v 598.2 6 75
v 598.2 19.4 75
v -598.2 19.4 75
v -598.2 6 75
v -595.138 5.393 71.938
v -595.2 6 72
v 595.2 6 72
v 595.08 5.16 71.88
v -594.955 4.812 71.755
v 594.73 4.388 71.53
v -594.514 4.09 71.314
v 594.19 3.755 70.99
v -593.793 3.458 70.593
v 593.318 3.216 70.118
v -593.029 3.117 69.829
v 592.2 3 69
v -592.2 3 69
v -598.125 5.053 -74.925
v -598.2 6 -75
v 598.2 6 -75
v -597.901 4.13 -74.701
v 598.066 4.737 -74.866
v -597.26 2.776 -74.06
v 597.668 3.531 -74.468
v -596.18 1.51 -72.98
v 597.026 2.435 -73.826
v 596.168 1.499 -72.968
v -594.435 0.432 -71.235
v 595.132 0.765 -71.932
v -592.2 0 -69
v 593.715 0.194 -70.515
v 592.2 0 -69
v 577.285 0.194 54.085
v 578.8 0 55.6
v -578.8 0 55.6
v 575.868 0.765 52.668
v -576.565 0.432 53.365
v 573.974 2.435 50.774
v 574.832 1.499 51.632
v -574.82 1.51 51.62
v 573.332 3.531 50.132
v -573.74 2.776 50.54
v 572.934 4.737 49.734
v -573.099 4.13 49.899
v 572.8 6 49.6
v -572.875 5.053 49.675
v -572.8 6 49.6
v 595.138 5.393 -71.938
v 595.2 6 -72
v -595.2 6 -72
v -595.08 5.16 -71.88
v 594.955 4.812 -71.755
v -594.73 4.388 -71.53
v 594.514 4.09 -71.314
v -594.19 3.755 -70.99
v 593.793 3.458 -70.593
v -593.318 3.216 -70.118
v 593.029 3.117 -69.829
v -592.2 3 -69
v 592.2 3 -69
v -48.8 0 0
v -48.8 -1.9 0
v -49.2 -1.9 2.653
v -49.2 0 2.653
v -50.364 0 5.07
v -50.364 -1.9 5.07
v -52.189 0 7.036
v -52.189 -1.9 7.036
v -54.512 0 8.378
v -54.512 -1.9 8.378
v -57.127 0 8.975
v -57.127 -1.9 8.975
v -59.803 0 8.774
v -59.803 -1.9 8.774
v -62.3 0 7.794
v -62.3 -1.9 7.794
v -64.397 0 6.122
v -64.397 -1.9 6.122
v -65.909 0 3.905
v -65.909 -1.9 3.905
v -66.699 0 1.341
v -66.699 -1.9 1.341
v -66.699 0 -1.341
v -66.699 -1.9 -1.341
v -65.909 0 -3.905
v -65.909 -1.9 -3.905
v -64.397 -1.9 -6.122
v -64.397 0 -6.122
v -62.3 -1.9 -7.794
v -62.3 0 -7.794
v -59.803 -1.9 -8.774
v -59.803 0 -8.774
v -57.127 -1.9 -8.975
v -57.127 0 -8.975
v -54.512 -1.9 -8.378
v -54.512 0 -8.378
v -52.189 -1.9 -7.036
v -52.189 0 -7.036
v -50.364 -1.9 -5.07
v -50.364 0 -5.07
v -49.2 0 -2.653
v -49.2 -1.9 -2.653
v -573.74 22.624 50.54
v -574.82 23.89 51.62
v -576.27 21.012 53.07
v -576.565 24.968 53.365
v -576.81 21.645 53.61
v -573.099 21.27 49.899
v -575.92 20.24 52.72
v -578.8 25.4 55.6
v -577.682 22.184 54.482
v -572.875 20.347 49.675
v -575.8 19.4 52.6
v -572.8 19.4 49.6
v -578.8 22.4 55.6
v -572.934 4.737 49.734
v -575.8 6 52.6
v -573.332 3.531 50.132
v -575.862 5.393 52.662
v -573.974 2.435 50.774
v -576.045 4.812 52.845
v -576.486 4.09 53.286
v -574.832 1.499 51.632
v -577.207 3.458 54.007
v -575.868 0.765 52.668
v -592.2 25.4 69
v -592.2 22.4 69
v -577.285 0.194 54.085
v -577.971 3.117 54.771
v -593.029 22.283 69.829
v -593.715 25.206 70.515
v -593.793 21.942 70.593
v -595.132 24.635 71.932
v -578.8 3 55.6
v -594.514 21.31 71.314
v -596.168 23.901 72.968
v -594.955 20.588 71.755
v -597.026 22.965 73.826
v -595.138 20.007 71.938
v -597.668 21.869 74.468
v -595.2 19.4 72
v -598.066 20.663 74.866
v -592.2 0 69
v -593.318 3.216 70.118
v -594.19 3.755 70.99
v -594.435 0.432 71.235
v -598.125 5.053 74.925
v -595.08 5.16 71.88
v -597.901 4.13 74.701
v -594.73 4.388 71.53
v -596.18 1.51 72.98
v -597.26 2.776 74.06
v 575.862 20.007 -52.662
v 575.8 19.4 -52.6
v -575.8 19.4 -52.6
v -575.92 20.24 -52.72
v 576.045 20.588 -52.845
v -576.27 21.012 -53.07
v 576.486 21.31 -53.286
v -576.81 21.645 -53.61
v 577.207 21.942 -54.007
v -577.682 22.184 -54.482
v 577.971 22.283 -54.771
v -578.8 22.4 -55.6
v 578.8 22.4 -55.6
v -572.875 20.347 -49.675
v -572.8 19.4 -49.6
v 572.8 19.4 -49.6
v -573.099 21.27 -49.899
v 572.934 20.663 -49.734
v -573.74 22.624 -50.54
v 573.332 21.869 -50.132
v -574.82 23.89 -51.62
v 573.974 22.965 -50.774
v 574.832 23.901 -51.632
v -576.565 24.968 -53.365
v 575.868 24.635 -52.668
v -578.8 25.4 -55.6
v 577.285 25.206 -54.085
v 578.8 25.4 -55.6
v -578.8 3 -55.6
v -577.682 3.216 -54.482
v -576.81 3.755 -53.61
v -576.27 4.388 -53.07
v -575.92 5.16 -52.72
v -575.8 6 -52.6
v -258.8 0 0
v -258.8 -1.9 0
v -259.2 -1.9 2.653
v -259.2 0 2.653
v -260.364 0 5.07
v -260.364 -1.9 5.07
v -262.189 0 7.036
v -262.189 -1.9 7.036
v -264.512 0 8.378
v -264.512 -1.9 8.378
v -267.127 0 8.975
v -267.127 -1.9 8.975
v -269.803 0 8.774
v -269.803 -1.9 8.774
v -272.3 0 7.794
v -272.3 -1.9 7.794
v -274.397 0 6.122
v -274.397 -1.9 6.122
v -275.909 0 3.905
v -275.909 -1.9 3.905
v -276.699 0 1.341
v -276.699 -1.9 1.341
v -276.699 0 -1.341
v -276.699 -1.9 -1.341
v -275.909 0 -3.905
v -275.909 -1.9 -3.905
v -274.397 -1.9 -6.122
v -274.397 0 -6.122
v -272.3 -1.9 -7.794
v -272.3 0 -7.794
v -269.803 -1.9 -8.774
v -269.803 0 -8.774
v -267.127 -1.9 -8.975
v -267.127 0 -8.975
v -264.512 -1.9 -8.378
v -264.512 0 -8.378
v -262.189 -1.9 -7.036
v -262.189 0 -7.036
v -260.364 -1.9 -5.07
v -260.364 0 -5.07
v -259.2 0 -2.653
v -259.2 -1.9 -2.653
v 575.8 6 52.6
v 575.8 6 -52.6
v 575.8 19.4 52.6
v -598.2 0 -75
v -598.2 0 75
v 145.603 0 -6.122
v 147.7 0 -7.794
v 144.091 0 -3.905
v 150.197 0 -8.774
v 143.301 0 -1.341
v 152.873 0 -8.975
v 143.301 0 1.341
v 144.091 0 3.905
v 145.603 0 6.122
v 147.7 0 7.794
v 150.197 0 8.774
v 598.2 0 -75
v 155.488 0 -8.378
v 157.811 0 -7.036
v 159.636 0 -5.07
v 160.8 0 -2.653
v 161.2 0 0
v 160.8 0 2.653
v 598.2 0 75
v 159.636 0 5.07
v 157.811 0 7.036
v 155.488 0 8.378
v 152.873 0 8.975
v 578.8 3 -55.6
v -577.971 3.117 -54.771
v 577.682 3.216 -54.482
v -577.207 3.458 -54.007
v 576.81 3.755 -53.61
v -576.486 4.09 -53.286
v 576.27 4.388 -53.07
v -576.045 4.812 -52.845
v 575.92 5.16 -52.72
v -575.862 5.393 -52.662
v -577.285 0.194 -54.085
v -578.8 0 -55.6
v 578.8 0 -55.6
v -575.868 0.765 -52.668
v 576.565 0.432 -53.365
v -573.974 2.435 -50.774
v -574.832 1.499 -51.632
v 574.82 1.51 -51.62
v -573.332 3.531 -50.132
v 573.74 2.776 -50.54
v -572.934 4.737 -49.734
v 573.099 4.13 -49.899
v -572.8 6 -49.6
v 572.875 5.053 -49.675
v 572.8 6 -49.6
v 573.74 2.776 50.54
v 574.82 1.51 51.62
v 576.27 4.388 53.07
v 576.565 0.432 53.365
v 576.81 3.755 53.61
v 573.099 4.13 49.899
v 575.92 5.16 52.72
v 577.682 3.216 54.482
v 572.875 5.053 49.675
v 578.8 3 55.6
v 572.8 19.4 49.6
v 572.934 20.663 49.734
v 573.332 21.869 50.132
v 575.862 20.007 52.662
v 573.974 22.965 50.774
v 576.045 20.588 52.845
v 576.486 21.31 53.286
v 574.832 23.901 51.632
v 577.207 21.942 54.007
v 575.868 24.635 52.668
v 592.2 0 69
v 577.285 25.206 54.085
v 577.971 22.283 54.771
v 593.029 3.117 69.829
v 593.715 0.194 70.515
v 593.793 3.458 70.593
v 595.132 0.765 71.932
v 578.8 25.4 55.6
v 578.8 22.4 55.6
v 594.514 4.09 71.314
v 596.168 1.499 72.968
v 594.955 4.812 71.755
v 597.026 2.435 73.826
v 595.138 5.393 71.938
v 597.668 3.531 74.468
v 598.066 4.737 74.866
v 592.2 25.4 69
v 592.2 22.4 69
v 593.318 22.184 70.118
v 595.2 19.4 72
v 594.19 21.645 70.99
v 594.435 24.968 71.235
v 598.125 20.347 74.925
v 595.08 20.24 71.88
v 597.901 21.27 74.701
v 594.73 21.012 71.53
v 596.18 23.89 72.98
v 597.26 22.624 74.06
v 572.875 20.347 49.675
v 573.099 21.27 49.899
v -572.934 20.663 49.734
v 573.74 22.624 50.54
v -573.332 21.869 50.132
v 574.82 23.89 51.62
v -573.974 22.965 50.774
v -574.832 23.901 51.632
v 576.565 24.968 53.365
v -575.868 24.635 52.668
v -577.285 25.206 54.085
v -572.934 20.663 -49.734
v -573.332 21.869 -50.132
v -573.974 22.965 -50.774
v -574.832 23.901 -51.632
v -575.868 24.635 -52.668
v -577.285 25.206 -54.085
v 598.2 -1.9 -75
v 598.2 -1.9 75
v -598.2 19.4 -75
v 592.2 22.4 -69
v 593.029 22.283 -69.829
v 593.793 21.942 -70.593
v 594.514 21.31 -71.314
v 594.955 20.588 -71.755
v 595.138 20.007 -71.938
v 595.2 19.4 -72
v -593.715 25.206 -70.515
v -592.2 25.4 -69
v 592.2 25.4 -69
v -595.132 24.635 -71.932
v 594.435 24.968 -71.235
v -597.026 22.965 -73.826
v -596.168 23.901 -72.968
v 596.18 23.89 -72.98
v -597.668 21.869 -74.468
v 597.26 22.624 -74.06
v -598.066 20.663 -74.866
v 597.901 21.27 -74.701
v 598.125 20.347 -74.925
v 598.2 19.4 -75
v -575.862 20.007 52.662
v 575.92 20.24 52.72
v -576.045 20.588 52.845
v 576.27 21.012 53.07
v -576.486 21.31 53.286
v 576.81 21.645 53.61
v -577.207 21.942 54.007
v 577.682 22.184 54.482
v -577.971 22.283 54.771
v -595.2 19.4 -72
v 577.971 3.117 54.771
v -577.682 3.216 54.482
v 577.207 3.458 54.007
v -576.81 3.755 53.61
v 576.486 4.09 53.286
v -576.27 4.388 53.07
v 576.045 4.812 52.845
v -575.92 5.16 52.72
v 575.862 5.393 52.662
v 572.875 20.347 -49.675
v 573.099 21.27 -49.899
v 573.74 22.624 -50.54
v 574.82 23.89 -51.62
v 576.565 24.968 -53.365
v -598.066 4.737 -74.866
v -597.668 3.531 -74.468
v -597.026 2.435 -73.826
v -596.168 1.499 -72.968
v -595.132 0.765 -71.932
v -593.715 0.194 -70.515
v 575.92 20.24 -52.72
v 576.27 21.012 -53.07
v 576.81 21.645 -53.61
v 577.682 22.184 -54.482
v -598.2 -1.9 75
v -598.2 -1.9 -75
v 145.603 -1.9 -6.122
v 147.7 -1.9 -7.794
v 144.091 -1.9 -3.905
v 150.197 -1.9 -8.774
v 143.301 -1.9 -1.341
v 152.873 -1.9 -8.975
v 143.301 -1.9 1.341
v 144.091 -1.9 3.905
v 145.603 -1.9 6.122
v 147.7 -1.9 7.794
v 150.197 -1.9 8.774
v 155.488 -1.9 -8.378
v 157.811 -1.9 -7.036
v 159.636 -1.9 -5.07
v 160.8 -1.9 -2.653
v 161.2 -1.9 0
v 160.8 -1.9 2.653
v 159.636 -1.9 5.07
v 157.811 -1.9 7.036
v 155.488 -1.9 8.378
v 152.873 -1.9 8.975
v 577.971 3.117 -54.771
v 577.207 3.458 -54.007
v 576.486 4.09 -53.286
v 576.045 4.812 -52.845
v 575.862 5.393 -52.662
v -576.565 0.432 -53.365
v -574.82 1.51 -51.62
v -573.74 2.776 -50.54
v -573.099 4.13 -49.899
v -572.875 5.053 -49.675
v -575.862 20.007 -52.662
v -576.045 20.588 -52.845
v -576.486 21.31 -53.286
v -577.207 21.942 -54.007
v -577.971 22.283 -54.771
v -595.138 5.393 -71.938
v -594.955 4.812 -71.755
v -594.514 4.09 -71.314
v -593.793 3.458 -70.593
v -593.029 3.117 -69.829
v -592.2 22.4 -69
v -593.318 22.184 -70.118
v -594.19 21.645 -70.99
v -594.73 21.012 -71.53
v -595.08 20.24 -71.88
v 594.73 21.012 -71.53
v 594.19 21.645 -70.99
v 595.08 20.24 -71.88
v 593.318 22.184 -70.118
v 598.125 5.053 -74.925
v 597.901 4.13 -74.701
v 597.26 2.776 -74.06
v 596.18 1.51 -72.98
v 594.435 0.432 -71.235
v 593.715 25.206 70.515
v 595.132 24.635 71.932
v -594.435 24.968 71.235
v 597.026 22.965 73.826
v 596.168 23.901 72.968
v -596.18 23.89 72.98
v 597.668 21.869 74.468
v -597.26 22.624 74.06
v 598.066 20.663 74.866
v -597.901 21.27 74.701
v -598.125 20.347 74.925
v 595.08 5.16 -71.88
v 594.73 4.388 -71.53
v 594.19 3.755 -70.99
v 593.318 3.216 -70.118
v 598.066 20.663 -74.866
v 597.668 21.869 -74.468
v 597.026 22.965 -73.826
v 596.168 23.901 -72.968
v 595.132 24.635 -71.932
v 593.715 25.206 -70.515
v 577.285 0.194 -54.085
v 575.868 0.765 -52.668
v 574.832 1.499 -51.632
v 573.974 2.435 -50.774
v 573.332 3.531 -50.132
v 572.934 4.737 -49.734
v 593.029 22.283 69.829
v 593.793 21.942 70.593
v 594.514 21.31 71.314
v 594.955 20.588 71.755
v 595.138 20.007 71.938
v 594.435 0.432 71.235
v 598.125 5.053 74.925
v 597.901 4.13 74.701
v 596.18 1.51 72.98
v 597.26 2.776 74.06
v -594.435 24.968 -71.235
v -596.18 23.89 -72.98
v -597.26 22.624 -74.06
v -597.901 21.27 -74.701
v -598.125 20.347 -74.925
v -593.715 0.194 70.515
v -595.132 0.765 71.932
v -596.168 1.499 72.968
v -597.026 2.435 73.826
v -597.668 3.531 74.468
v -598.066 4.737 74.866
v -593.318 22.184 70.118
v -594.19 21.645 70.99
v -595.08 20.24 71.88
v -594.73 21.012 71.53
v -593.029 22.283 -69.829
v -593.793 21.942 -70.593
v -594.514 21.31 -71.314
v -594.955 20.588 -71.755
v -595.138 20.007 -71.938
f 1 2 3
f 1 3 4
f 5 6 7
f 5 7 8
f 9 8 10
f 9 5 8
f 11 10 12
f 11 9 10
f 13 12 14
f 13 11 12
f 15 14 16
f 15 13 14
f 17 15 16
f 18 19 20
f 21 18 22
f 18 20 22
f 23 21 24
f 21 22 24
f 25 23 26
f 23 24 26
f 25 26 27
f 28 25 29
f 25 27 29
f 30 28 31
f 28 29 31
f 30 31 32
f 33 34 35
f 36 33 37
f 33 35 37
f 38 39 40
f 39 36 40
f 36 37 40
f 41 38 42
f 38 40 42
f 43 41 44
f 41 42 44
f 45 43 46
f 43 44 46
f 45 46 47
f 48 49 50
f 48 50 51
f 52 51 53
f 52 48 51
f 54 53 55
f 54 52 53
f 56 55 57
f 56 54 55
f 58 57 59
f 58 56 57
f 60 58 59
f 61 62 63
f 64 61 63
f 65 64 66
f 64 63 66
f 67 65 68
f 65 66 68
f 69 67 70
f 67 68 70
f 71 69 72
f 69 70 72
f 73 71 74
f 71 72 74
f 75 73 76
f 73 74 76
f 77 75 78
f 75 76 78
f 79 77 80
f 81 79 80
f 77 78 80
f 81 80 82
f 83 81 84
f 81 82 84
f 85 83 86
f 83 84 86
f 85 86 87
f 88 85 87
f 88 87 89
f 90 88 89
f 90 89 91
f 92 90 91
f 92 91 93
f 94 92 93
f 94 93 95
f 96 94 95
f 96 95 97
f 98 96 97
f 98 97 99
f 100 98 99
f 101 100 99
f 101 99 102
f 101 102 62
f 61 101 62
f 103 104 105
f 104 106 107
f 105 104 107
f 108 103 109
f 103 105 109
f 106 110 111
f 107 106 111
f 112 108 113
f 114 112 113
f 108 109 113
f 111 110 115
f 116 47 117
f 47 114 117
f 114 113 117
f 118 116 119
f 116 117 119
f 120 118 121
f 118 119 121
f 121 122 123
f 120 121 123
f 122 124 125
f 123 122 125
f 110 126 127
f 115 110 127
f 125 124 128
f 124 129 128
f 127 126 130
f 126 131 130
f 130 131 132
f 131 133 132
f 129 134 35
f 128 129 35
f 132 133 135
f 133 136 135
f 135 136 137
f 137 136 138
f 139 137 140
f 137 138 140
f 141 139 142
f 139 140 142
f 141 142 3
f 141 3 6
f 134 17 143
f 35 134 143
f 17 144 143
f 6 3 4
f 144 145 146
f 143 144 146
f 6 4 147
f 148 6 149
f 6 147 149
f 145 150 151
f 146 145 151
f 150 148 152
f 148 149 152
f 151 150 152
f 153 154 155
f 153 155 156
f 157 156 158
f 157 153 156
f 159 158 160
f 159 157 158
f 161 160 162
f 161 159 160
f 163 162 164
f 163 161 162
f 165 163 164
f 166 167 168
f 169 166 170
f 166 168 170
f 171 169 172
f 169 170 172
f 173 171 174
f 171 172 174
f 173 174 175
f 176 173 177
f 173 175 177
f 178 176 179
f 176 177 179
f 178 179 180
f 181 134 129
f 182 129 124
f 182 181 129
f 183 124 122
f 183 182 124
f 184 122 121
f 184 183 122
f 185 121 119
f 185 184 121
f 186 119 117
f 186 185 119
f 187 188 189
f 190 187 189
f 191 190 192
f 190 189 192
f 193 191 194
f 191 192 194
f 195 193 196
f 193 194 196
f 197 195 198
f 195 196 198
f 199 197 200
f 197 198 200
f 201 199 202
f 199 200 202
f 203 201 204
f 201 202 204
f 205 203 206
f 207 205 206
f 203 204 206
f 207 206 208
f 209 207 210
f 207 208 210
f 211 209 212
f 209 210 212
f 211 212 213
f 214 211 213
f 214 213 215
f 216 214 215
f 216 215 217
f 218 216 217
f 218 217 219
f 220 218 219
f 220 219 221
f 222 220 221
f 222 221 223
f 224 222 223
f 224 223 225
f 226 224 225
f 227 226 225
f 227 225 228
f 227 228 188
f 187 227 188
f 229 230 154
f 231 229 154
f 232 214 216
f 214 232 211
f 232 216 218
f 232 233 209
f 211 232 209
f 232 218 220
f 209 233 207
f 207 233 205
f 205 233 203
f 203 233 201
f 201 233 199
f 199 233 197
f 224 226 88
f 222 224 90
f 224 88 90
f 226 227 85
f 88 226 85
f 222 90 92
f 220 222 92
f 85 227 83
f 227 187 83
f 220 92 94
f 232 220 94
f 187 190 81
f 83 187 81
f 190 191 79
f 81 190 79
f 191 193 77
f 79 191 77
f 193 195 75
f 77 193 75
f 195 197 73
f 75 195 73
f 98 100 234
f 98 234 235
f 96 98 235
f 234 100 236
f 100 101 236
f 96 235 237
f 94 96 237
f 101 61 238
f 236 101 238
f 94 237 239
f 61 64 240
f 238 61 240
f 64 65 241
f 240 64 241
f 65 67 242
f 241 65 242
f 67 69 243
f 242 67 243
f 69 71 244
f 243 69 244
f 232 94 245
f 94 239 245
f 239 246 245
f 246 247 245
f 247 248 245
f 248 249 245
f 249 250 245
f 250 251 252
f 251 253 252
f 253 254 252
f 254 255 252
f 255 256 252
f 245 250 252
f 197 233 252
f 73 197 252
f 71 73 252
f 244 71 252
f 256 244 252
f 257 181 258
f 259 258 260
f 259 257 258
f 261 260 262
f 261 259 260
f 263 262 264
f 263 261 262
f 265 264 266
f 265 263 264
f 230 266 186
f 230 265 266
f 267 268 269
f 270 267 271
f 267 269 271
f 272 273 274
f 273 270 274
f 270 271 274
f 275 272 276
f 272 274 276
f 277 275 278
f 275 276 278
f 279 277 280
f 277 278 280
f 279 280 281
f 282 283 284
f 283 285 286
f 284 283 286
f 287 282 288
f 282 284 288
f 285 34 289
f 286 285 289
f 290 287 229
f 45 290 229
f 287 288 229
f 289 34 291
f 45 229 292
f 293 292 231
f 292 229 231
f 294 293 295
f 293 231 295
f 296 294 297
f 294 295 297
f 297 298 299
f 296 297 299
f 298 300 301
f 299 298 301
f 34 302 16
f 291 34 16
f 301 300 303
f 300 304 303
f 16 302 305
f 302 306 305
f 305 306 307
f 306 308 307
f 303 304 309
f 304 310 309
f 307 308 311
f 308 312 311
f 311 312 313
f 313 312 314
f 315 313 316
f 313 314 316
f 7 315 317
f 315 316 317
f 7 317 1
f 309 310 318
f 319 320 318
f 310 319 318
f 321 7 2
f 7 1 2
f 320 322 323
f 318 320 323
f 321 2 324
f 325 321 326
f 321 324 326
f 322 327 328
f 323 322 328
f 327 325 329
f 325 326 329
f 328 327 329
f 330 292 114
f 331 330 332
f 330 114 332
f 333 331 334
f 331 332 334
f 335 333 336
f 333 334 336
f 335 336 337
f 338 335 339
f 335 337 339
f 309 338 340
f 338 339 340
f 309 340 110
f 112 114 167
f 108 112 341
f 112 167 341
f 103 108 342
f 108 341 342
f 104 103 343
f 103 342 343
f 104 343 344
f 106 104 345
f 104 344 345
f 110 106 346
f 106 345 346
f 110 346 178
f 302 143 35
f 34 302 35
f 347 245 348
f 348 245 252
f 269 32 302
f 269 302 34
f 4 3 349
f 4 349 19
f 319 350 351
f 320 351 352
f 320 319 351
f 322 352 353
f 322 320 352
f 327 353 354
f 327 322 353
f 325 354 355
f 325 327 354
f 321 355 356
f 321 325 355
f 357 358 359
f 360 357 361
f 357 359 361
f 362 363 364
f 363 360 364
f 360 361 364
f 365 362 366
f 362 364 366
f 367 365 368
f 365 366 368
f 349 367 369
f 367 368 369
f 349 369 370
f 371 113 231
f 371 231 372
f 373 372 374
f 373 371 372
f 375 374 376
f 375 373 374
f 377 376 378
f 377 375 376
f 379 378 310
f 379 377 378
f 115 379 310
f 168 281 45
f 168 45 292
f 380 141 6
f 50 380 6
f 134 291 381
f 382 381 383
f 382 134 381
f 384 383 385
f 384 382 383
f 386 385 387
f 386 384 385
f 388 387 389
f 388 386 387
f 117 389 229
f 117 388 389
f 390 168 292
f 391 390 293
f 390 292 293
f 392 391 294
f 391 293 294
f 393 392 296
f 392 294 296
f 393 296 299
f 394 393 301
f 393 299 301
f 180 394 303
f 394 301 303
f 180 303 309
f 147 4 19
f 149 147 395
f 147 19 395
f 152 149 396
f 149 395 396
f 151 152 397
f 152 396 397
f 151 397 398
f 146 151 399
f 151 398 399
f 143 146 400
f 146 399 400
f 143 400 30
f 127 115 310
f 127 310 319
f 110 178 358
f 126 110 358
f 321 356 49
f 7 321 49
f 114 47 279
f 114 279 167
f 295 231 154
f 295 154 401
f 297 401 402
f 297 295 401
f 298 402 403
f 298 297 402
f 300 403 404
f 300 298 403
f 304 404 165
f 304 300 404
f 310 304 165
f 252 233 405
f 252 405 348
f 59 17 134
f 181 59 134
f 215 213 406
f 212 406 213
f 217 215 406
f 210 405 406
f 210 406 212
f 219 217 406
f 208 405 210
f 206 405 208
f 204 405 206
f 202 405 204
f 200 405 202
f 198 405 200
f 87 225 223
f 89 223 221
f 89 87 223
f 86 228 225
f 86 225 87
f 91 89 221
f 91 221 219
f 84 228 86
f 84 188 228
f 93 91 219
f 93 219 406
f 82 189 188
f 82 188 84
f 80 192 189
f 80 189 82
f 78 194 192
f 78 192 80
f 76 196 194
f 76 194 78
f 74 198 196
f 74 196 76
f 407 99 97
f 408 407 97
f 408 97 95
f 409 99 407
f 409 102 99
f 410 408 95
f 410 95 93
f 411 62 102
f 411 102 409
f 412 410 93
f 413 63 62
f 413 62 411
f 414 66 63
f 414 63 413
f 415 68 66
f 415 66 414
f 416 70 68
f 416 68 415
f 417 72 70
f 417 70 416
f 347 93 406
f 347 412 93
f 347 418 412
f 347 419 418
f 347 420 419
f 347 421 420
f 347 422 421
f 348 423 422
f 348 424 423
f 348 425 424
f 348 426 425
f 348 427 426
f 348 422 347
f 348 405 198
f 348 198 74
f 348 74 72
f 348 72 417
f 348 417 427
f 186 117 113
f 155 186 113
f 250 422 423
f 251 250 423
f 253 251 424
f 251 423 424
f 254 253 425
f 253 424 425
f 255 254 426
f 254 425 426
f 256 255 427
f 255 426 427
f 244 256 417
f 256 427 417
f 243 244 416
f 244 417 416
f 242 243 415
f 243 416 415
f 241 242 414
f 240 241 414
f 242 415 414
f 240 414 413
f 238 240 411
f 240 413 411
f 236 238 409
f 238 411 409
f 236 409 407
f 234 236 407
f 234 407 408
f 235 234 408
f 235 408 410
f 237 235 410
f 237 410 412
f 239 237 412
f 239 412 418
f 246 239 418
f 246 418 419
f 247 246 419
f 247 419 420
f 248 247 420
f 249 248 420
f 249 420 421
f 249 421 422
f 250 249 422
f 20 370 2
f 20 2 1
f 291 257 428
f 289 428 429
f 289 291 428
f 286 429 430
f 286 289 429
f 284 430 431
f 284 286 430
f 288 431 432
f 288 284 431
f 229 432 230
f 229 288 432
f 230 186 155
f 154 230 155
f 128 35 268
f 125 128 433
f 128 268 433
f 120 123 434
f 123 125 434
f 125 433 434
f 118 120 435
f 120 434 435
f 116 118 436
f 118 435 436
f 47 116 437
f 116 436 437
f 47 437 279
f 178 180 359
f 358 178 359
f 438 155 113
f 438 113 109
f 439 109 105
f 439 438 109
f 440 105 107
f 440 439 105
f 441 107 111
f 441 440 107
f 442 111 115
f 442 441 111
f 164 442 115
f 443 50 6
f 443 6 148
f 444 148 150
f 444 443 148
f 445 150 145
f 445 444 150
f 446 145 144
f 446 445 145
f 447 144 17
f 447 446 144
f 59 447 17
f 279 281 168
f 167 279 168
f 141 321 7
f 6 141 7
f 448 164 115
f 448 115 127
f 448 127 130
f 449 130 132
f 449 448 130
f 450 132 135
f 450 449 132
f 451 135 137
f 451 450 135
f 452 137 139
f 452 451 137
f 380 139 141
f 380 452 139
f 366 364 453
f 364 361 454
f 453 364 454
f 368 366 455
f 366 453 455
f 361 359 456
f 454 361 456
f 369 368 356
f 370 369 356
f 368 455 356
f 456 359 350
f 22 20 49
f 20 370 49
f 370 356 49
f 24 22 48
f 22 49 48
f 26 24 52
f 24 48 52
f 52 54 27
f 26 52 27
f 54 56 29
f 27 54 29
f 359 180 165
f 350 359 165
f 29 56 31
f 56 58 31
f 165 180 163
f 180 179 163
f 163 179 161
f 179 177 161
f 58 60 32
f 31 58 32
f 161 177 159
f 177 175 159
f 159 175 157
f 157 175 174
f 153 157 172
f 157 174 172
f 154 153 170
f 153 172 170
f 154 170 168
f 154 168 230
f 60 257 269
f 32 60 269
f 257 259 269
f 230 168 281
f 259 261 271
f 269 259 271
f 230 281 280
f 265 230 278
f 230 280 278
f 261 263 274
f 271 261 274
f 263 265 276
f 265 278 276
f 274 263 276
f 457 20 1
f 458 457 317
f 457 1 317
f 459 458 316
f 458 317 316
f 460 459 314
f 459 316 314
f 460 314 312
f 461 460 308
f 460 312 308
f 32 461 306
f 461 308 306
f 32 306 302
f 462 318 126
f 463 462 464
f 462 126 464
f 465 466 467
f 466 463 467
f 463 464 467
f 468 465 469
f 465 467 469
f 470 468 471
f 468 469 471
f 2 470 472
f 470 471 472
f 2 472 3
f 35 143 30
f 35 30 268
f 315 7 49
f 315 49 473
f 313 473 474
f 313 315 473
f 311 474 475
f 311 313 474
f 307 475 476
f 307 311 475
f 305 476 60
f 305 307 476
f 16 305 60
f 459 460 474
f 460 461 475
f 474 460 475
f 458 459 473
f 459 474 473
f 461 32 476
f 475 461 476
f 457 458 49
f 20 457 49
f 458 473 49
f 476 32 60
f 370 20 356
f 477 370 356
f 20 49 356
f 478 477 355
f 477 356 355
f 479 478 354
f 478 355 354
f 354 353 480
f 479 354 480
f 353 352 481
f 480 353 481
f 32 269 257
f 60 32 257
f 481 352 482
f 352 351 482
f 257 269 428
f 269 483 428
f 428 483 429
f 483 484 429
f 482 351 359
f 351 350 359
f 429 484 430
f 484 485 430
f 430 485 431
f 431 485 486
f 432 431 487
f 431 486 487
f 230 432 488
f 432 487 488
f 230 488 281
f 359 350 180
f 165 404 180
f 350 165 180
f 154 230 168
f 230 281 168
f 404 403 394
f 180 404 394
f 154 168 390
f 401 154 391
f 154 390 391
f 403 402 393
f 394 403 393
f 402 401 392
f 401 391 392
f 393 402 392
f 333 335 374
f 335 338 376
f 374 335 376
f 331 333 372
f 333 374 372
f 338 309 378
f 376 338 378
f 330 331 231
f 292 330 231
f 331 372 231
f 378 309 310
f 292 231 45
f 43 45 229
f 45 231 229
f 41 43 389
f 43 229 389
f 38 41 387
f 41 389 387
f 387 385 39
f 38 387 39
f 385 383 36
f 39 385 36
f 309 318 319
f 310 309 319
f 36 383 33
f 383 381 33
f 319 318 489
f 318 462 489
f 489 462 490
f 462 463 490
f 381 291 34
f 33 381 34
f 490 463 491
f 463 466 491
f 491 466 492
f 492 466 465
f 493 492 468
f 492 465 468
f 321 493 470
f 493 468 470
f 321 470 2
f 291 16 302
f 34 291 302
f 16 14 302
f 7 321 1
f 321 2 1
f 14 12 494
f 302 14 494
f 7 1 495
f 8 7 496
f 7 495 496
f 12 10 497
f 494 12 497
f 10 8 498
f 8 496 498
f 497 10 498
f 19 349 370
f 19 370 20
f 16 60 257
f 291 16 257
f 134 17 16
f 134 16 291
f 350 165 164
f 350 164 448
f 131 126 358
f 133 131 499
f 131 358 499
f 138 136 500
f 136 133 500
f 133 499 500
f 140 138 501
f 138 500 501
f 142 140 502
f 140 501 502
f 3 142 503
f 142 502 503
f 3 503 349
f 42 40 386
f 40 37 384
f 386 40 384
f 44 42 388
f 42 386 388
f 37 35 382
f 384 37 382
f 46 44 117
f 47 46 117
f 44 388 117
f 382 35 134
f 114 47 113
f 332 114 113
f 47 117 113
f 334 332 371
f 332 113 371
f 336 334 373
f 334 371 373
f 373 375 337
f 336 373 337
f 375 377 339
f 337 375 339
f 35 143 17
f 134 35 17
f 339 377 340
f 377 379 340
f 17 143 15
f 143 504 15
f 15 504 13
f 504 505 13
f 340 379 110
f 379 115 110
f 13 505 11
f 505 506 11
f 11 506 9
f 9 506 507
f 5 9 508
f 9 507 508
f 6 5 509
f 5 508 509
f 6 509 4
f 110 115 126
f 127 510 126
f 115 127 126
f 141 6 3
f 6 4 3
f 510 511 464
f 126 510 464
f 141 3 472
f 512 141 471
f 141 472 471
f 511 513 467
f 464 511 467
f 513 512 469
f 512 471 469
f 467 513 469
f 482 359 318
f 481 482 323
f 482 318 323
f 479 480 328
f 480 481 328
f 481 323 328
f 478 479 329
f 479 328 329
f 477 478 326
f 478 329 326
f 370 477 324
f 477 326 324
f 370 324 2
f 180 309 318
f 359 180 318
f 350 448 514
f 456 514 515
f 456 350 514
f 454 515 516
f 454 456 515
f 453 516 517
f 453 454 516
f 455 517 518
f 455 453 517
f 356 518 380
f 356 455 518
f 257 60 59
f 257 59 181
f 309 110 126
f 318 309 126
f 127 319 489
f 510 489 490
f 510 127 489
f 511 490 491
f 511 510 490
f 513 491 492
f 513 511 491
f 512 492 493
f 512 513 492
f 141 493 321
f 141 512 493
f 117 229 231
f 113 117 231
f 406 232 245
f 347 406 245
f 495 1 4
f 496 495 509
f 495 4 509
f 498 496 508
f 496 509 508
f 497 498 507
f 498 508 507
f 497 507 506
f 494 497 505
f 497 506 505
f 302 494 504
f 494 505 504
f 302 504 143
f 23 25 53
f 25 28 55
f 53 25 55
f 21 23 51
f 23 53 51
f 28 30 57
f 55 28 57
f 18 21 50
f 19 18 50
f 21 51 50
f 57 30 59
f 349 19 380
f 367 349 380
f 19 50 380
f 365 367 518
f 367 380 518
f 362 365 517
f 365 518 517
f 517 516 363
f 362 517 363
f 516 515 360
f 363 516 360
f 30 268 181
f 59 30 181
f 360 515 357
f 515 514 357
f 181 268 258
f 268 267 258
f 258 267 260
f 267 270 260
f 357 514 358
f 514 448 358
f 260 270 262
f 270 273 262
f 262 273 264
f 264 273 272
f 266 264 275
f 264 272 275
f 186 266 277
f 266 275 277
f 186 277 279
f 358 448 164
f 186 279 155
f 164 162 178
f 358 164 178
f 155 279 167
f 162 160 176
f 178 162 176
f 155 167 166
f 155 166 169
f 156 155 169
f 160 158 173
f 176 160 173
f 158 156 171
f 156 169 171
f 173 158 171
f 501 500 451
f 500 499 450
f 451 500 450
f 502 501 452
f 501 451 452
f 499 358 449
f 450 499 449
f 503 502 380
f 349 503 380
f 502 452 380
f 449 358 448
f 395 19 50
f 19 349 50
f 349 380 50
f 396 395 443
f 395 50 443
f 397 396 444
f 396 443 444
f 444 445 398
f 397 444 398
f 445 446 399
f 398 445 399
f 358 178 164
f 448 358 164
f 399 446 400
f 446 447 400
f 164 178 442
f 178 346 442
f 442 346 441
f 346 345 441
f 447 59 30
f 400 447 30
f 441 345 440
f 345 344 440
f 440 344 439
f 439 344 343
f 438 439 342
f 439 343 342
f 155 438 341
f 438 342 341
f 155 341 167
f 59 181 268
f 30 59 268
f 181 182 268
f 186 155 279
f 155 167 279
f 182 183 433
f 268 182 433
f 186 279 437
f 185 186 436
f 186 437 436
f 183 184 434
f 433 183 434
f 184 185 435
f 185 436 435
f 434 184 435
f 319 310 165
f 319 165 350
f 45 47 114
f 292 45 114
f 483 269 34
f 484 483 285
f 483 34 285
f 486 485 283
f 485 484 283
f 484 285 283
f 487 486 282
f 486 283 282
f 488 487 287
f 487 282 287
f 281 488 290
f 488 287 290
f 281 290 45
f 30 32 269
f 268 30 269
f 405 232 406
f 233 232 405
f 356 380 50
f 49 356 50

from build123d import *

# Parameters (mm, degrees)
TUBO_CUADRADO_2_X_2_X_0_25_1_DEPTH      = 186.921024484
TUBO_CUADRADO_2_X_2_X_0_25_1_DEPTH_BACK = 36.921024484
TUBO_CUADRADO_2_X_2_X_0_25_1_2_DEPTH    = 1270.242048969
TUBO_CUADRADO_2_X_2_X_0_25_1_3_DEPTH    = 223.842048969
TUBO_CUADRADO_2_X_2_X_0_25_1_4_DEPTH    = 1270.242048969
CROQUIS3_W                              = 1196.4
CROQUIS3_H                              = 150
SALIENTE_EXTRUIR1_DEPTH                 = 1.9
CROQUIS6_R                              = 9
CORTAR_EXTRUIR1_DEPTH                   = 10


with BuildPart() as part:
    # Sketch1 → Tubo cuadrado 2 X 2 X 0.25(1) (new, two sides: drawn at the far end of the back side and taken through both)
    with BuildSketch(Plane(origin=(-585.5, 12.7, -75), x_dir=(1, 0, 0), z_dir=(0, 0, 1)).offset(-TUBO_CUADRADO_2_X_2_X_0_25_1_DEPTH_BACK)):
        with BuildLine():
            Line((-6.7, -12.7), (6.7, -12.7))
            ThreePointArc((6.7, -12.7), (10.942640687, -10.942640687), (12.7, -6.7))
            Line((12.7, -6.7), (12.7, 6.7))
            ThreePointArc((12.7, 6.7), (10.942640687, 10.942640687), (6.7, 12.7))
            Line((6.7, 12.7), (-6.7, 12.7))
            ThreePointArc((-6.7, 12.7), (-10.942640687, 10.942640687), (-12.7, 6.7))
            Line((-12.7, 6.7), (-12.7, -6.7))
            ThreePointArc((-12.7, -6.7), (-10.942640687, -10.942640687), (-6.7, -12.7))
        make_face()
        with BuildLine():
            Line((-6.7, -9.7), (6.7, -9.7))
            ThreePointArc((6.7, -9.7), (8.821320344, -8.821320344), (9.7, -6.7))
            Line((9.7, -6.7), (9.7, 6.7))
            ThreePointArc((9.7, 6.7), (8.821320344, 8.821320344), (6.7, 9.7))
            Line((6.7, 9.7), (-6.7, 9.7))
            ThreePointArc((-6.7, 9.7), (-8.821320344, 8.821320344), (-9.7, 6.7))
            Line((-9.7, 6.7), (-9.7, -6.7))
            ThreePointArc((-9.7, -6.7), (-8.821320344, -8.821320344), (-6.7, -9.7))
        make_face(mode=Mode.SUBTRACT)
    extrude(amount=TUBO_CUADRADO_2_X_2_X_0_25_1_DEPTH + TUBO_CUADRADO_2_X_2_X_0_25_1_DEPTH_BACK)

    # Tubo cuadrado 2 X 2 X 0.25(1) mitre 1
    split(bisect_by=Plane(origin=(-598.2, 0, -75), x_dir=(0, -1, 0), z_dir=(-0.707106781, 0, 0.707106781)), keep=Keep.TOP)

    # Tubo cuadrado 2 X 2 X 0.25(1) mitre 2
    split(bisect_by=Plane(origin=(-598.2, 0, 75), x_dir=(0, -1, 0), z_dir=(-0.707106781, 0, -0.707106781)), keep=Keep.TOP)


with BuildPart() as body_2:
    # Sketch1 on segment 2 (carried to segment 2) → Tubo cuadrado 2 X 2 X 0.25_1 2 (new body)
    with BuildSketch(Plane(origin=(-635.121024484, 12.7, 62.3), x_dir=(0, 0, -1), z_dir=(1, 0, 0))):
        with BuildLine():
            Line((-6.7, -12.7), (6.7, -12.7))
            ThreePointArc((6.7, -12.7), (10.942640687, -10.942640687), (12.7, -6.7))
            Line((12.7, -6.7), (12.7, 6.7))
            ThreePointArc((12.7, 6.7), (10.942640687, 10.942640687), (6.7, 12.7))
            Line((6.7, 12.7), (-6.7, 12.7))
            ThreePointArc((-6.7, 12.7), (-10.942640687, 10.942640687), (-12.7, 6.7))
            Line((-12.7, 6.7), (-12.7, -6.7))
            ThreePointArc((-12.7, -6.7), (-10.942640687, -10.942640687), (-6.7, -12.7))
        make_face()
        with BuildLine():
            Line((-6.7, -9.7), (6.7, -9.7))
            ThreePointArc((6.7, -9.7), (8.821320344, -8.821320344), (9.7, -6.7))
            Line((9.7, -6.7), (9.7, 6.7))
            ThreePointArc((9.7, 6.7), (8.821320344, 8.821320344), (6.7, 9.7))
            Line((6.7, 9.7), (-6.7, 9.7))
            ThreePointArc((-6.7, 9.7), (-8.821320344, 8.821320344), (-9.7, 6.7))
            Line((-9.7, 6.7), (-9.7, -6.7))
            ThreePointArc((-9.7, -6.7), (-8.821320344, -8.821320344), (-6.7, -9.7))
        make_face(mode=Mode.SUBTRACT)
    extrude(amount=TUBO_CUADRADO_2_X_2_X_0_25_1_2_DEPTH)

    # Tubo cuadrado 2 X 2 X 0.25_1 2 mitre 1
    split(bisect_by=Plane(origin=(-598.2, 0, 75), x_dir=(0, 1, 0), z_dir=(0.707106781, 0, 0.707106781)), keep=Keep.TOP)

    # Tubo cuadrado 2 X 2 X 0.25_1 2 mitre 2
    split(bisect_by=Plane(origin=(598.2, 0, 75), x_dir=(0, -1, 0), z_dir=(-0.707106781, 0, 0.707106781)), keep=Keep.TOP)


with BuildPart() as body_3:
    # Sketch1 on segment 3 (carried to segment 3) → Tubo cuadrado 2 X 2 X 0.25_1 3 (new body)
    with BuildSketch(Plane(origin=(585.5, 12.7, 111.921024484), x_dir=(-1, 0, 0), z_dir=(0, 0, -1))):
        with BuildLine():
            Line((-6.7, -12.7), (6.7, -12.7))
            ThreePointArc((6.7, -12.7), (10.942640687, -10.942640687), (12.7, -6.7))
            Line((12.7, -6.7), (12.7, 6.7))
            ThreePointArc((12.7, 6.7), (10.942640687, 10.942640687), (6.7, 12.7))
            Line((6.7, 12.7), (-6.7, 12.7))
            ThreePointArc((-6.7, 12.7), (-10.942640687, 10.942640687), (-12.7, 6.7))
            Line((-12.7, 6.7), (-12.7, -6.7))
            ThreePointArc((-12.7, -6.7), (-10.942640687, -10.942640687), (-6.7, -12.7))
        make_face()
        with BuildLine():
            Line((-6.7, -9.7), (6.7, -9.7))
            ThreePointArc((6.7, -9.7), (8.821320344, -8.821320344), (9.7, -6.7))
            Line((9.7, -6.7), (9.7, 6.7))
            ThreePointArc((9.7, 6.7), (8.821320344, 8.821320344), (6.7, 9.7))
            Line((6.7, 9.7), (-6.7, 9.7))
            ThreePointArc((-6.7, 9.7), (-8.821320344, 8.821320344), (-9.7, 6.7))
            Line((-9.7, 6.7), (-9.7, -6.7))
            ThreePointArc((-9.7, -6.7), (-8.821320344, -8.821320344), (-6.7, -9.7))
        make_face(mode=Mode.SUBTRACT)
    extrude(amount=TUBO_CUADRADO_2_X_2_X_0_25_1_3_DEPTH)

    # Tubo cuadrado 2 X 2 X 0.25_1 3 mitre 1
    split(bisect_by=Plane(origin=(598.2, 0, -75), x_dir=(0, 1, 0), z_dir=(0.707106781, 0, 0.707106781)), keep=Keep.TOP)

    # Tubo cuadrado 2 X 2 X 0.25_1 3 mitre 2
    split(bisect_by=Plane(origin=(598.2, 0, 75), x_dir=(0, 1, 0), z_dir=(0.707106781, 0, -0.707106781)), keep=Keep.TOP)


with BuildPart() as body_4:
    # Sketch1 on segment 4 (carried to segment 4) → Tubo cuadrado 2 X 2 X 0.25_1 4 (new body)
    with BuildSketch(Plane(origin=(635.121024484, 12.7, -62.3), x_dir=(0, 0, 1), z_dir=(-1, 0, 0))):
        with BuildLine():
            Line((-6.7, -12.7), (6.7, -12.7))
            ThreePointArc((6.7, -12.7), (10.942640687, -10.942640687), (12.7, -6.7))
            Line((12.7, -6.7), (12.7, 6.7))
            ThreePointArc((12.7, 6.7), (10.942640687, 10.942640687), (6.7, 12.7))
            Line((6.7, 12.7), (-6.7, 12.7))
            ThreePointArc((-6.7, 12.7), (-10.942640687, 10.942640687), (-12.7, 6.7))
            Line((-12.7, 6.7), (-12.7, -6.7))
            ThreePointArc((-12.7, -6.7), (-10.942640687, -10.942640687), (-6.7, -12.7))
        make_face()
        with BuildLine():
            Line((-6.7, -9.7), (6.7, -9.7))
            ThreePointArc((6.7, -9.7), (8.821320344, -8.821320344), (9.7, -6.7))
            Line((9.7, -6.7), (9.7, 6.7))
            ThreePointArc((9.7, 6.7), (8.821320344, 8.821320344), (6.7, 9.7))
            Line((6.7, 9.7), (-6.7, 9.7))
            ThreePointArc((-6.7, 9.7), (-8.821320344, 8.821320344), (-9.7, 6.7))
            Line((-9.7, 6.7), (-9.7, -6.7))
            ThreePointArc((-9.7, -6.7), (-8.821320344, -8.821320344), (-6.7, -9.7))
        make_face(mode=Mode.SUBTRACT)
    extrude(amount=TUBO_CUADRADO_2_X_2_X_0_25_1_4_DEPTH)

    # Tubo cuadrado 2 X 2 X 0.25_1 4 mitre 1
    split(bisect_by=Plane(origin=(-598.2, 0, -75), x_dir=(0, 1, 0), z_dir=(0.707106781, 0, -0.707106781)), keep=Keep.TOP)

    # Tubo cuadrado 2 X 2 X 0.25_1 4 mitre 2
    split(bisect_by=Plane(origin=(598.2, 0, -75), x_dir=(0, -1, 0), z_dir=(-0.707106781, 0, -0.707106781)), keep=Keep.TOP)


with BuildPart() as body_5:
    # Croquis3 → Saliente-Extruir1 (new body)
    with BuildSketch(Plane.XZ):
        Rectangle(CROQUIS3_W, CROQUIS3_H)
    extrude(amount=SALIENTE_EXTRUIR1_DEPTH)

    # Croquis6 → Cortar-Extruir1 (cut)
    with BuildSketch(Plane.XZ.offset(1.9)):
        with Locations((-267.8, 0)):
            Circle(CROQUIS6_R)
        with Locations((-57.8, 0)):
            Circle(CROQUIS6_R)
        with Locations((152.2, 0)):
            Circle(CROQUIS6_R)
    extrude(amount=-CORTAR_EXTRUIR1_DEPTH, mode=Mode.SUBTRACT)


solid = Compound([part.part, body_2.part, body_3.part, body_4.part, body_5.part])
